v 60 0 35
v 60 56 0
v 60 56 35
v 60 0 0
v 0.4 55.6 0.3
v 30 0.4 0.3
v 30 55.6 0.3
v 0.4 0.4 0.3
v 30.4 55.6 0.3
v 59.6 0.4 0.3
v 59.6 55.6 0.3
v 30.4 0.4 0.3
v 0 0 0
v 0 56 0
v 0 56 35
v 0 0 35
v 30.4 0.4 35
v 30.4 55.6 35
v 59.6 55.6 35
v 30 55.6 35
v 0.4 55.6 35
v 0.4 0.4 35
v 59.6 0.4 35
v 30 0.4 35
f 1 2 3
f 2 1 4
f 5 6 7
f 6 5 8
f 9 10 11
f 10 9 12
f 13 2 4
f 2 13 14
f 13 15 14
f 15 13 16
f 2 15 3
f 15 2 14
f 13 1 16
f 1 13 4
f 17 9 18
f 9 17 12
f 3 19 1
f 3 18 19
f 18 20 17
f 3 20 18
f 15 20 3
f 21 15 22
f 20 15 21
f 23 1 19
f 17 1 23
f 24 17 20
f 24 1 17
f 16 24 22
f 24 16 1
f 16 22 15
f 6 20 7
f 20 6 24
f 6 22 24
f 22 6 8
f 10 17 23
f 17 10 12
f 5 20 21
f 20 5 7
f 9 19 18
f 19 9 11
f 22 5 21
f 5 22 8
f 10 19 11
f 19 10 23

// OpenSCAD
outer_width = 60;
outer_depth = 56;
wall_height = 35;

bottom_thickness = 0.3;
wall_thickness = 0.4;

type = "half_short"; //half_short, half_long, quarters

cube([outer_width, outer_depth, bottom_thickness]);
if (type == "half_long" || type == "quarters")
    translate([0, outer_depth / 2, 0])
        cube([outer_width, wall_thickness, wall_height]);
if (type == "half_short" || type == "quarters")
    translate([outer_width / 2, 0, 0])
        cube([wall_thickness, outer_depth, wall_height]);

translate([0, 0, 0])
    cube([outer_width, wall_thickness, wall_height]);
translate([0, outer_depth - wall_thickness, 0])
    cube([outer_width, wall_thickness, wall_height]);
translate([0, 0, 0])
    cube([wall_thickness, outer_depth, wall_height]);
translate([outer_width - wall_thickness, 0, 0])
    cube([wall_thickness, outer_depth, wall_height]);
